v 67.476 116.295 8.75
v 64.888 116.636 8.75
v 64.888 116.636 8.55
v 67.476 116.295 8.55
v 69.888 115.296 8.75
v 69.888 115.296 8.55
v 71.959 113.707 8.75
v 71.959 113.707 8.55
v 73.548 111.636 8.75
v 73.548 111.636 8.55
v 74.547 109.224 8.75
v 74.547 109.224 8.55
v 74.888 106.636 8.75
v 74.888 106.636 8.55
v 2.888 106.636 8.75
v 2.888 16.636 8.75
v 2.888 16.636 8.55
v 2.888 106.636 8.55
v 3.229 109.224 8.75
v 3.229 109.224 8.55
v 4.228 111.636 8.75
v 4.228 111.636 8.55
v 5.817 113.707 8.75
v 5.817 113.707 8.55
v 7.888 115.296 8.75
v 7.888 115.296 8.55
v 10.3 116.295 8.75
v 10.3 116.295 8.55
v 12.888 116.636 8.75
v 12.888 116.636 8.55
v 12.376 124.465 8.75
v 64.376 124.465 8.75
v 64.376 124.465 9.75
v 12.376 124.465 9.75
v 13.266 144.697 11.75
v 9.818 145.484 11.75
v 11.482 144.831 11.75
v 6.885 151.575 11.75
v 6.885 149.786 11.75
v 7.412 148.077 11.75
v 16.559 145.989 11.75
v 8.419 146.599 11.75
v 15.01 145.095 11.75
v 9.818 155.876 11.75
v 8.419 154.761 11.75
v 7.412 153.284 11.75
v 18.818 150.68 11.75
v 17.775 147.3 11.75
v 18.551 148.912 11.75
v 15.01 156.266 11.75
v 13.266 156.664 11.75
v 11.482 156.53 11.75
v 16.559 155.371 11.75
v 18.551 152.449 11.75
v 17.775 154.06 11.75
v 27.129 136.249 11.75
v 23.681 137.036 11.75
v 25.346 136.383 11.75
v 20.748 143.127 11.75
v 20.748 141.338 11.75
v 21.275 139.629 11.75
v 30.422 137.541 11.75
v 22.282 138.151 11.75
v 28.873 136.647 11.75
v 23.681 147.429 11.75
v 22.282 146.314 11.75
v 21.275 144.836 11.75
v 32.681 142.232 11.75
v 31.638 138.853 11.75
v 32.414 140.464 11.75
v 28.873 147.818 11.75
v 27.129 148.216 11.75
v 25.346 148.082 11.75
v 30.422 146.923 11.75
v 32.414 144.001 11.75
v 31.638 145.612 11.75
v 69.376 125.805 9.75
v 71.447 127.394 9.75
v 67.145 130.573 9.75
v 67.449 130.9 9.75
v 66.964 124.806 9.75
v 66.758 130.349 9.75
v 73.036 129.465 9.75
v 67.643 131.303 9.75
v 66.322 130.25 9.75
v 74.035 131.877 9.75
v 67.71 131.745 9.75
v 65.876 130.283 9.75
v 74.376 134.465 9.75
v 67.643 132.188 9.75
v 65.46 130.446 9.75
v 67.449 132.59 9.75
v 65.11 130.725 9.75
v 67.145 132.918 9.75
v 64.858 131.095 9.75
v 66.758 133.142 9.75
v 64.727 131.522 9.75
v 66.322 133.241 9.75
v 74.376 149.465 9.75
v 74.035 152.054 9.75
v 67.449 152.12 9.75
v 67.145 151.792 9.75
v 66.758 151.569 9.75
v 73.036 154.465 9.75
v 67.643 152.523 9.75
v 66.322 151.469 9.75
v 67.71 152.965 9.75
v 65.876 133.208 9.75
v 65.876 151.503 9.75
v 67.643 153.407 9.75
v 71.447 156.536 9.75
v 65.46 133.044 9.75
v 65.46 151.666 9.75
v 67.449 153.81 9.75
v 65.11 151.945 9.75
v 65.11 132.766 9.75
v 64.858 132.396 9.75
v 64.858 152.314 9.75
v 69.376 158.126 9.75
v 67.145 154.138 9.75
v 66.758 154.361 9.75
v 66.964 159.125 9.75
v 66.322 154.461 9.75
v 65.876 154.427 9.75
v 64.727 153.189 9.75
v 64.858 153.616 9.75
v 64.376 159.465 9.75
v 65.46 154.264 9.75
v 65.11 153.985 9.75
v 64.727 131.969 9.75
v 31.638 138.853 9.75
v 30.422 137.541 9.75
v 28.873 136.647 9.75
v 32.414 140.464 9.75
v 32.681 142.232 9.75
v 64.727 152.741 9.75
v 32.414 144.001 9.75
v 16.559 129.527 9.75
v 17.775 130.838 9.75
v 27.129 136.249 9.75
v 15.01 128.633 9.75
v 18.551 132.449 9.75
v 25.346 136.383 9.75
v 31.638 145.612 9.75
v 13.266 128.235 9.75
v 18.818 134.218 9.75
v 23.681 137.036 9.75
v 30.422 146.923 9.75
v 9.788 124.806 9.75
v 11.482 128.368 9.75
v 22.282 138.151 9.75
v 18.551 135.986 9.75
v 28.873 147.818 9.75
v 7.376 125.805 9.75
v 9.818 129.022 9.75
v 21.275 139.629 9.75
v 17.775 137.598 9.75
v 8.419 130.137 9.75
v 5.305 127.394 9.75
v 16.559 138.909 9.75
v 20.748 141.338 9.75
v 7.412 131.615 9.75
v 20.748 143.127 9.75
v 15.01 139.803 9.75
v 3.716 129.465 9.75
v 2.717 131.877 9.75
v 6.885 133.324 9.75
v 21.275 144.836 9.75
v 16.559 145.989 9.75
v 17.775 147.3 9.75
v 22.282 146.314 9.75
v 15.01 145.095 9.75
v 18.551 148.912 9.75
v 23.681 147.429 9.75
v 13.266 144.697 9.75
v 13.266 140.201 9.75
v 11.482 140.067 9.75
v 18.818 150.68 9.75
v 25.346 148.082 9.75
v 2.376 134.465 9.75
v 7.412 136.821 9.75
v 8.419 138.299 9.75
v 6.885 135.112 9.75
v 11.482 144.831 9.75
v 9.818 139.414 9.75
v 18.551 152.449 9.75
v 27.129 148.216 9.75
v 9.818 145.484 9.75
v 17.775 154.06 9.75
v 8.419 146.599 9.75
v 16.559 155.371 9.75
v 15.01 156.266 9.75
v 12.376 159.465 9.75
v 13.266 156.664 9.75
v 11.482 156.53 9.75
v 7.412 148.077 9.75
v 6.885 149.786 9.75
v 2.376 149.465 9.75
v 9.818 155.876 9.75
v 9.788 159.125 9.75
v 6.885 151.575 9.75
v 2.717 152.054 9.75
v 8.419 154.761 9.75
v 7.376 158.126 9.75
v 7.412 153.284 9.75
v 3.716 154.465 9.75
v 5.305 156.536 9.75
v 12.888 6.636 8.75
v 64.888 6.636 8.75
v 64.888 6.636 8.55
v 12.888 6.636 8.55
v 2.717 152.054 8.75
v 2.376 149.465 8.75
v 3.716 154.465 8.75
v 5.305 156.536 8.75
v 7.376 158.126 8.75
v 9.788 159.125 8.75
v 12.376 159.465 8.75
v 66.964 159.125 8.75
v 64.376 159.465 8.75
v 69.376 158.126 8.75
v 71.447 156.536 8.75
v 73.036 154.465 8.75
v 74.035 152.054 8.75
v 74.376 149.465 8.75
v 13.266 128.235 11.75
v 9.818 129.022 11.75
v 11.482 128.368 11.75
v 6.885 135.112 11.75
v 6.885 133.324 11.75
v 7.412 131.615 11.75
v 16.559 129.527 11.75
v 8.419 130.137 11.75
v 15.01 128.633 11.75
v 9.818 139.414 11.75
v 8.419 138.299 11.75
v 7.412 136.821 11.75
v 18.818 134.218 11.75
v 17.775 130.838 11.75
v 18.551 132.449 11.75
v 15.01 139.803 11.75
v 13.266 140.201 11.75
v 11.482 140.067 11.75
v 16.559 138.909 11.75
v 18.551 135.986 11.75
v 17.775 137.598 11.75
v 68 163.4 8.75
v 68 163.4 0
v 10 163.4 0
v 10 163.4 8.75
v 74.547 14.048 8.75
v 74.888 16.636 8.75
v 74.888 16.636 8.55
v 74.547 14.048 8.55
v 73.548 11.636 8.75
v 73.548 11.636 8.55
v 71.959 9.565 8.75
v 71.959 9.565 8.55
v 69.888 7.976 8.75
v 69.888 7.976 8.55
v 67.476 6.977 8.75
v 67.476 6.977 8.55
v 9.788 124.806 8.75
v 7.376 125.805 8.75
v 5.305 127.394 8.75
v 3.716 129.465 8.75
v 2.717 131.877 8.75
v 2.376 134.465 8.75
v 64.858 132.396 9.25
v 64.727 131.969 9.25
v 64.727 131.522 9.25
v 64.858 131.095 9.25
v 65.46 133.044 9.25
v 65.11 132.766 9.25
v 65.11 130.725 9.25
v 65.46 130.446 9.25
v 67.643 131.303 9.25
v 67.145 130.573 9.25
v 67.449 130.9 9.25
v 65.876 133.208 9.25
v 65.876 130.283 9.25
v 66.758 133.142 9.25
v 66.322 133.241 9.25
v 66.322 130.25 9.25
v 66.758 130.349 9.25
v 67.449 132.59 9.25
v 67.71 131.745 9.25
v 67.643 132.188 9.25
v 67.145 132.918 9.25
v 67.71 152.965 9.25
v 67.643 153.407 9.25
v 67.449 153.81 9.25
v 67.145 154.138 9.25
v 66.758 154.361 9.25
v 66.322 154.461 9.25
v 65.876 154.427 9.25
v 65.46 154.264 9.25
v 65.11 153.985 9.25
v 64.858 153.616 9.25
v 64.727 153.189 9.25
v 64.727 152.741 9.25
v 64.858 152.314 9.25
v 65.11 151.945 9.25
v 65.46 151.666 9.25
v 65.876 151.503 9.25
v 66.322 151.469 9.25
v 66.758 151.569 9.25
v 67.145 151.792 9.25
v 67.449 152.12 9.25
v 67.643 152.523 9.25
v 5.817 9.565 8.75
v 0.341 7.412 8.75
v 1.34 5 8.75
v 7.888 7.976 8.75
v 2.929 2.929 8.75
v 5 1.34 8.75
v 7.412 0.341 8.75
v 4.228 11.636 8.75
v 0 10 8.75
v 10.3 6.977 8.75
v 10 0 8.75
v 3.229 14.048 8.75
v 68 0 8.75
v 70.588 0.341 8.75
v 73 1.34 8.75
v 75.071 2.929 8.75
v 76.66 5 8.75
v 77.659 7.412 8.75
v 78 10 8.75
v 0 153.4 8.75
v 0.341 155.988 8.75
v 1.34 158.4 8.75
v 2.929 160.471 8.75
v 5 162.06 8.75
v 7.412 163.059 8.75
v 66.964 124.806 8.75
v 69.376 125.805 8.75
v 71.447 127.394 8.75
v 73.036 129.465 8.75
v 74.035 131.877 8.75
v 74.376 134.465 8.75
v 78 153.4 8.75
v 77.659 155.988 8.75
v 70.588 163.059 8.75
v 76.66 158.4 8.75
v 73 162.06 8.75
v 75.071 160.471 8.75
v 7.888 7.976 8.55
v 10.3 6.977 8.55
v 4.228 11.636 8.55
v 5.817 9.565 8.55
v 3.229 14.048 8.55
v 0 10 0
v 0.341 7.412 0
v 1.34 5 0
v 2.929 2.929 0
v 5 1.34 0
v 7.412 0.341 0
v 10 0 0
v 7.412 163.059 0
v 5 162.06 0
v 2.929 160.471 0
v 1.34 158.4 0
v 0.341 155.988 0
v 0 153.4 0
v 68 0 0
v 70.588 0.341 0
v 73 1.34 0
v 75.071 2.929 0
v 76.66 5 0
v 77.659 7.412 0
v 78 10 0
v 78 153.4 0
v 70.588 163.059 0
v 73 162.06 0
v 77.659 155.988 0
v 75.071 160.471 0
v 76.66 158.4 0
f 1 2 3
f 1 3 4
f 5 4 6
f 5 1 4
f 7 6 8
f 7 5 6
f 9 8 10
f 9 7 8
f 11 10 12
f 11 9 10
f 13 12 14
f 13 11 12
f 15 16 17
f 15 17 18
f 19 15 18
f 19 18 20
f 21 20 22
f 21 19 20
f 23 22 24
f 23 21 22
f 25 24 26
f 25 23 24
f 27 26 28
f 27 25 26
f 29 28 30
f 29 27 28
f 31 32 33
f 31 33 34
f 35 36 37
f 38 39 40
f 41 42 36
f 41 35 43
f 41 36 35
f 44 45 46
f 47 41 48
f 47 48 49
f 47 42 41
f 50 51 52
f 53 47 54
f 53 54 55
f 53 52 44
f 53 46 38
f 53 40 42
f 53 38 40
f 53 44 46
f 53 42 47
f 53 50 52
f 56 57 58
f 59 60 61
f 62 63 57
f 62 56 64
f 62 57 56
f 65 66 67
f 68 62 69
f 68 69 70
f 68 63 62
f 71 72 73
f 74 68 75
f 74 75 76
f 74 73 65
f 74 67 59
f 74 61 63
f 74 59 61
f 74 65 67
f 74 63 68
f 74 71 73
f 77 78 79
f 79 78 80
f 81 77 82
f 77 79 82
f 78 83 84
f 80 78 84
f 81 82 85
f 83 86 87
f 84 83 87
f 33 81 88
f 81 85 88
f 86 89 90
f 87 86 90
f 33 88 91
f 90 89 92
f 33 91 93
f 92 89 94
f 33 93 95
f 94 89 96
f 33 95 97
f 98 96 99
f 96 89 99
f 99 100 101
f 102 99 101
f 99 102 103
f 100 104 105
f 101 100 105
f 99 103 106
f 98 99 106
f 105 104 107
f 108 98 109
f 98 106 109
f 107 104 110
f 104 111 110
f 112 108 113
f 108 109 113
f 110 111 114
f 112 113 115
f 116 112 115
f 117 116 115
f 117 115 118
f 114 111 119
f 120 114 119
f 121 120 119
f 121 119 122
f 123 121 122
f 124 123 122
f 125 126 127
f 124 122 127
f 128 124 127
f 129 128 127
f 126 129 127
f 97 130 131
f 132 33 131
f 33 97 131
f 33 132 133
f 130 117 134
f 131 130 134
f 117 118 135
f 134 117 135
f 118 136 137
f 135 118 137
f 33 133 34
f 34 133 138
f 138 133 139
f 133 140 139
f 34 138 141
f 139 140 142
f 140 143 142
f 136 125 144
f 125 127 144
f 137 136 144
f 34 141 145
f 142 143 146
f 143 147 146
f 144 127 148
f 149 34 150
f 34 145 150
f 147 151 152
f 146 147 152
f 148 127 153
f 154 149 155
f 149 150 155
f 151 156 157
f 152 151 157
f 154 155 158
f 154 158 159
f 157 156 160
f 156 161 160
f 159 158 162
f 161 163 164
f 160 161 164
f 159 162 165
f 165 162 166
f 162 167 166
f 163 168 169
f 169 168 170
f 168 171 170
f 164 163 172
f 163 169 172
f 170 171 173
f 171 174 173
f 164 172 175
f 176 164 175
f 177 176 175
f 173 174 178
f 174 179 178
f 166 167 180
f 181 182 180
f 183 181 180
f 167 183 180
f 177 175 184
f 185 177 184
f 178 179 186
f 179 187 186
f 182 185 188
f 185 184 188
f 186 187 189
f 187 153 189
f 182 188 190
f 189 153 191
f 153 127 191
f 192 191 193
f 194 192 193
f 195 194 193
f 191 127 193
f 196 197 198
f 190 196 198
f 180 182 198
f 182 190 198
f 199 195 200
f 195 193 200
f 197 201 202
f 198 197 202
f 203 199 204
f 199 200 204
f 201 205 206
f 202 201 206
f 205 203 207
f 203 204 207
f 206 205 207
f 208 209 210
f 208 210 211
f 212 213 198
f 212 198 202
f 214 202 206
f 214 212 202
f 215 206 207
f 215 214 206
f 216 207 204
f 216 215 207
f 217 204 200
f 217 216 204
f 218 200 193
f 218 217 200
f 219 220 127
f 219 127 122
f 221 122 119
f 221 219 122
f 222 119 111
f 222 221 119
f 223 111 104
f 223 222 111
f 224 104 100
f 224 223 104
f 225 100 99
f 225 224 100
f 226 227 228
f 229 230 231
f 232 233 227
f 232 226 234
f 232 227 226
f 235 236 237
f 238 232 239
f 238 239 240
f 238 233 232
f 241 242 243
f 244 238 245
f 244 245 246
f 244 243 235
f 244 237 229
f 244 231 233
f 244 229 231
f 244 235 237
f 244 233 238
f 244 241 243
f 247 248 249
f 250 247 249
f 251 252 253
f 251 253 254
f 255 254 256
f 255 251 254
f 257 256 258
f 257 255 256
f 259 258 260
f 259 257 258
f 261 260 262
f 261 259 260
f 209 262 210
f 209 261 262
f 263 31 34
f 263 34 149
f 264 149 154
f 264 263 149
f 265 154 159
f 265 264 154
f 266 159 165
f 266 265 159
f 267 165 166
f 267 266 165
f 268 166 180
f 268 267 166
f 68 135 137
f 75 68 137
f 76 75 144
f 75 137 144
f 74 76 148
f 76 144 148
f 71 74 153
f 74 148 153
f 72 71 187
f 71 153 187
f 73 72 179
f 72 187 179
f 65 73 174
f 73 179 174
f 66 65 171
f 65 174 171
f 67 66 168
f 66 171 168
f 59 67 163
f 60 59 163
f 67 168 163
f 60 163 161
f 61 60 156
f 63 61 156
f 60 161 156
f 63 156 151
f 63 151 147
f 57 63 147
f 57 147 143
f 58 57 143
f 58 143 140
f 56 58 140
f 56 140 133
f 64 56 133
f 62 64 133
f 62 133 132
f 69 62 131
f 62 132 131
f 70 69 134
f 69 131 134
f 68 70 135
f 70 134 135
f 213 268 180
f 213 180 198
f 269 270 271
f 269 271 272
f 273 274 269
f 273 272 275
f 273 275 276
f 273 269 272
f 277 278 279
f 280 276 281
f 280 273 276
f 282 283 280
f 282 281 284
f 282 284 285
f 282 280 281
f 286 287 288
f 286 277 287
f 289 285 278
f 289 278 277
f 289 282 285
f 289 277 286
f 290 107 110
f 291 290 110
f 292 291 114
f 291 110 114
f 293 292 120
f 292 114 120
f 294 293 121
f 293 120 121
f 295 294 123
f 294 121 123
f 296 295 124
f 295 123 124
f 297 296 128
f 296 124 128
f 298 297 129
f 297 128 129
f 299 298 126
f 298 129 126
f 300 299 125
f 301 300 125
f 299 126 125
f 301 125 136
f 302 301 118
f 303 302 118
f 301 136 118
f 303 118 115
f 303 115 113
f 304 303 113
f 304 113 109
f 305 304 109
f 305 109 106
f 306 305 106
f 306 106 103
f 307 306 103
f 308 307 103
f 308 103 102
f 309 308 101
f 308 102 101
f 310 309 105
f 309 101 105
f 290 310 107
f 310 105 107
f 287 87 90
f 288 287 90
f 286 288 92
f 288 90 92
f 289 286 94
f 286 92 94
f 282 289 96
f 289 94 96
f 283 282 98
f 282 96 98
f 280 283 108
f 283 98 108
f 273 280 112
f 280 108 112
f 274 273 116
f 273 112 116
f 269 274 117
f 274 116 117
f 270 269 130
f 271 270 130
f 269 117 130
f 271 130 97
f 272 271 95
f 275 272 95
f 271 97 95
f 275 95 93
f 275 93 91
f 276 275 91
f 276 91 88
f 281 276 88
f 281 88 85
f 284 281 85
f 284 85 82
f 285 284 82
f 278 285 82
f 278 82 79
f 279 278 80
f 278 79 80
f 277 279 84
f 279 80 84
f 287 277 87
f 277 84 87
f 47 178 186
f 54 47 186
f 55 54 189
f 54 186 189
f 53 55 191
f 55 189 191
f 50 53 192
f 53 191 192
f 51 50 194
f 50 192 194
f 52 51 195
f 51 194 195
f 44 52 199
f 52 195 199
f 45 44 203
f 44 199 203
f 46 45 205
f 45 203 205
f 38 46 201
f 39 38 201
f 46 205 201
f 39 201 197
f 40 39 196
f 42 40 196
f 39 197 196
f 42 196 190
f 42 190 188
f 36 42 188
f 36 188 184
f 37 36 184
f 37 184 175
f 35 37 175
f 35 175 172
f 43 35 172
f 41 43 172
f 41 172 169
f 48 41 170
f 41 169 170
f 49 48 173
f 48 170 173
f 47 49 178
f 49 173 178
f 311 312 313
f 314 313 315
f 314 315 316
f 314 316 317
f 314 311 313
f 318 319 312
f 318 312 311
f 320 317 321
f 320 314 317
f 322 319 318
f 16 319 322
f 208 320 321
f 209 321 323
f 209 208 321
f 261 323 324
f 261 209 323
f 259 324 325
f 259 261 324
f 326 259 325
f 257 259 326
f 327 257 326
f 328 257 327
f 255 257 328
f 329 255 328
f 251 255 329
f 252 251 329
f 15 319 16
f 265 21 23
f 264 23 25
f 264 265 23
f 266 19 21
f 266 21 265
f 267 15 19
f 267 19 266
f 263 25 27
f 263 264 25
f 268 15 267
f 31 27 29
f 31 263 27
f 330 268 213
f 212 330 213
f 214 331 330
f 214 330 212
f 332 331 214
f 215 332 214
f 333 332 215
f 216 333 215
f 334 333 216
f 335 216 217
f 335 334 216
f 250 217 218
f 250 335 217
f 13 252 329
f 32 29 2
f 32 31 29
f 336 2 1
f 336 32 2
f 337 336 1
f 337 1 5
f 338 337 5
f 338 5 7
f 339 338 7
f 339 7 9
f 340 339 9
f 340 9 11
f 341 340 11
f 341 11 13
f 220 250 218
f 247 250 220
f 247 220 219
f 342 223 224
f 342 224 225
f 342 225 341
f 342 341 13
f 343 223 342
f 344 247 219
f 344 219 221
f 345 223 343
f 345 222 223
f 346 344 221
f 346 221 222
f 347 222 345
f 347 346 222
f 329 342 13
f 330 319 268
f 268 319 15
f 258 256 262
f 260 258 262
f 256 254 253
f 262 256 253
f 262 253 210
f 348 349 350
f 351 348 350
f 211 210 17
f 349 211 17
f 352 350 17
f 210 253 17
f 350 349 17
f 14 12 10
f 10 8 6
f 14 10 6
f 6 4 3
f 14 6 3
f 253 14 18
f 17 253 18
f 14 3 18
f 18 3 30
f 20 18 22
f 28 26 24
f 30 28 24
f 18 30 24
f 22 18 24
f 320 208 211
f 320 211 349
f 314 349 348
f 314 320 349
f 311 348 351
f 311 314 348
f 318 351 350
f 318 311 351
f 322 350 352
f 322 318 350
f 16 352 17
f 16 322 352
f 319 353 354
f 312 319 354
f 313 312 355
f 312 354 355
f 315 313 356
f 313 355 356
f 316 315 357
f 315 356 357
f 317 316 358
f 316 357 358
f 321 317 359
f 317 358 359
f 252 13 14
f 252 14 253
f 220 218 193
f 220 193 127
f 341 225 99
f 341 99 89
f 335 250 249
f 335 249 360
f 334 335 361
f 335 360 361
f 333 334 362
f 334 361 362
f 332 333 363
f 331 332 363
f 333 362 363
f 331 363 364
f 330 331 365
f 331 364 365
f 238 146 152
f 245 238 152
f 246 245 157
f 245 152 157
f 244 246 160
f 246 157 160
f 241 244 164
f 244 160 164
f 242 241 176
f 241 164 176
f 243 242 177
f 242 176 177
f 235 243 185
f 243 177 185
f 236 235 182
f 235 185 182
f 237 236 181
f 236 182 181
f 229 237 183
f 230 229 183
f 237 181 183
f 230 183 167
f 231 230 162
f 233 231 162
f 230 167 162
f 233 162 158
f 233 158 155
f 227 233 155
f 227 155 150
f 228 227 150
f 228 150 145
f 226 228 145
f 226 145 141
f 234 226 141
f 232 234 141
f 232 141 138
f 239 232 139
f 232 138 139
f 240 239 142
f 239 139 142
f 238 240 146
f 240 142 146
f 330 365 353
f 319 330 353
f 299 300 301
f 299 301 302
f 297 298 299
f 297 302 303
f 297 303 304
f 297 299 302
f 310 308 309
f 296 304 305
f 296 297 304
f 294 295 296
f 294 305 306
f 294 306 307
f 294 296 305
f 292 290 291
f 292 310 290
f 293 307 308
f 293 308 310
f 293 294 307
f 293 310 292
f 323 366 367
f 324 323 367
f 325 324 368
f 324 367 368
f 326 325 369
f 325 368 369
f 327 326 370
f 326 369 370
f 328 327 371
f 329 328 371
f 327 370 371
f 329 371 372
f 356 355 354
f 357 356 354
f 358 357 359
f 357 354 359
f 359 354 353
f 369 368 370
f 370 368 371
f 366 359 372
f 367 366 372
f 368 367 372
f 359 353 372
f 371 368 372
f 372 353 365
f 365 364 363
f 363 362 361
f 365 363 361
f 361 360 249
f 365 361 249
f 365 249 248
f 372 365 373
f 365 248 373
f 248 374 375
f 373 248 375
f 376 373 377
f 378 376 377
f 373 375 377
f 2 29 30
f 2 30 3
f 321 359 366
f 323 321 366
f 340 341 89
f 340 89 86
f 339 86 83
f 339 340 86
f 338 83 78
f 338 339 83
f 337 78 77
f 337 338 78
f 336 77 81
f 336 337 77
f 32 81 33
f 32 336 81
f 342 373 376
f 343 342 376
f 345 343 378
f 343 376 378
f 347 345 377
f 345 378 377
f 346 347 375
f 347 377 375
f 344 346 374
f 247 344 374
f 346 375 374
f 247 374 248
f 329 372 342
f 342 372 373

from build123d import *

# Parameters (mm, degrees)
BOSS_EXTRU_1_DEPTH      = 8.75
BOSS_EXTRU_2_DEPTH      = 1
ESQUISSE5_R             = 6
BOSS_EXTRU_3_DEPTH      = 2
ESQUISSE6_R             = 1.5
ENL_V_MAT_EXTRU_1_DEPTH = 0.5
ENL_V_MAT_EXTRU_2_DEPTH = 0.2


with BuildPart() as part:
    # Esquisse2 → Boss.-Extru.1 (new body)
    with BuildSketch(Plane.XY):
        with BuildLine():
            Line((10, 0), (68, 0))
            ThreePointArc((68, 0), (75.071067812, 2.928932188), (78, 10))
            Line((78, 10), (78, 153.4))
            ThreePointArc((78, 153.4), (75.071067812, 160.471067812), (68, 163.4))
            Line((68, 163.4), (10, 163.4))
            ThreePointArc((10, 163.4), (2.928932188, 160.471067812), (0, 153.4))
            Line((0, 153.4), (0, 10))
            ThreePointArc((0, 10), (2.928932188, 2.928932188), (10, 0))
        make_face()
    extrude(amount=BOSS_EXTRU_1_DEPTH)

    # Esquisse4 → Boss.-Extru.2 (add)
    with BuildSketch(Plane.XY.offset(8.75)):
        with BuildLine():
            Line((12.375884012, 159.465412193), (64.375884012, 159.465412193))
            ThreePointArc((64.375884012, 159.465412193), (71.446951823, 156.536480005), (74.375884012, 149.465412193))
            Line((74.375884012, 149.465412193), (74.375884012, 134.465412193))
            ThreePointArc((74.375884012, 134.465412193), (71.446951823, 127.394344381), (64.375884012, 124.465412193))
            Line((64.375884012, 124.465412193), (12.375884012, 124.465412193))
            ThreePointArc((12.375884012, 124.465412193), (5.3048162, 127.394344381), (2.375884012, 134.465412193))
            Line((2.375884012, 134.465412193), (2.375884012, 149.465412193))
            ThreePointArc((2.375884012, 149.465412193), (5.3048162, 156.536480005), (12.375884012, 159.465412193))
        make_face()
    extrude(amount=BOSS_EXTRU_2_DEPTH)

    # Esquisse5 → Boss.-Extru.3 (add)
    with BuildSketch(Plane.XY.offset(9.75)):
        with Locations((12.817579428, 150.680282261)):
            Circle(ESQUISSE5_R)
        with Locations((26.680664603, 142.232464732)):
            Circle(ESQUISSE5_R)
        with Locations((12.817579428, 134.217868615)):
            Circle(ESQUISSE5_R)
    extrude(amount=BOSS_EXTRU_3_DEPTH)

    # Esquisse6 → Enlèv. mat.-Extru.1 (cut)
    with BuildSketch(Plane.XY.offset(9.75)):
        with Locations((66.209801176, 152.964938364)):
            Circle(ESQUISSE6_R)
        with Locations((66.209801176, 131.745411373)):
            Circle(ESQUISSE6_R)
    extrude(amount=-ENL_V_MAT_EXTRU_1_DEPTH, mode=Mode.SUBTRACT)

    # Esquisse9 → Enlèv. mat.-Extru.2 (cut)
    with BuildSketch(Plane.XY.offset(8.75)):
        with BuildLine():
            Line((12.887963043, 116.636129809), (64.887963043, 116.636129809))
            ThreePointArc((64.887963043, 116.636129809), (71.959030855, 113.707197621), (74.887963043, 106.636129809))
            Line((74.887963043, 106.636129809), (74.887963043, 16.636129809))
            ThreePointArc((74.887963043, 16.636129809), (71.959030855, 9.565061997), (64.887963043, 6.636129809))
            Line((64.887963043, 6.636129809), (12.887963043, 6.636129809))
            ThreePointArc((12.887963043, 6.636129809), (5.816895231, 9.565061997), (2.887963043, 16.636129809))
            Line((2.887963043, 16.636129809), (2.887963043, 106.636129809))
            ThreePointArc((2.887963043, 106.636129809), (5.816895231, 113.707197621), (12.887963043, 116.636129809))
        make_face()
    extrude(amount=-ENL_V_MAT_EXTRU_2_DEPTH, mode=Mode.SUBTRACT)


solid = part.part
